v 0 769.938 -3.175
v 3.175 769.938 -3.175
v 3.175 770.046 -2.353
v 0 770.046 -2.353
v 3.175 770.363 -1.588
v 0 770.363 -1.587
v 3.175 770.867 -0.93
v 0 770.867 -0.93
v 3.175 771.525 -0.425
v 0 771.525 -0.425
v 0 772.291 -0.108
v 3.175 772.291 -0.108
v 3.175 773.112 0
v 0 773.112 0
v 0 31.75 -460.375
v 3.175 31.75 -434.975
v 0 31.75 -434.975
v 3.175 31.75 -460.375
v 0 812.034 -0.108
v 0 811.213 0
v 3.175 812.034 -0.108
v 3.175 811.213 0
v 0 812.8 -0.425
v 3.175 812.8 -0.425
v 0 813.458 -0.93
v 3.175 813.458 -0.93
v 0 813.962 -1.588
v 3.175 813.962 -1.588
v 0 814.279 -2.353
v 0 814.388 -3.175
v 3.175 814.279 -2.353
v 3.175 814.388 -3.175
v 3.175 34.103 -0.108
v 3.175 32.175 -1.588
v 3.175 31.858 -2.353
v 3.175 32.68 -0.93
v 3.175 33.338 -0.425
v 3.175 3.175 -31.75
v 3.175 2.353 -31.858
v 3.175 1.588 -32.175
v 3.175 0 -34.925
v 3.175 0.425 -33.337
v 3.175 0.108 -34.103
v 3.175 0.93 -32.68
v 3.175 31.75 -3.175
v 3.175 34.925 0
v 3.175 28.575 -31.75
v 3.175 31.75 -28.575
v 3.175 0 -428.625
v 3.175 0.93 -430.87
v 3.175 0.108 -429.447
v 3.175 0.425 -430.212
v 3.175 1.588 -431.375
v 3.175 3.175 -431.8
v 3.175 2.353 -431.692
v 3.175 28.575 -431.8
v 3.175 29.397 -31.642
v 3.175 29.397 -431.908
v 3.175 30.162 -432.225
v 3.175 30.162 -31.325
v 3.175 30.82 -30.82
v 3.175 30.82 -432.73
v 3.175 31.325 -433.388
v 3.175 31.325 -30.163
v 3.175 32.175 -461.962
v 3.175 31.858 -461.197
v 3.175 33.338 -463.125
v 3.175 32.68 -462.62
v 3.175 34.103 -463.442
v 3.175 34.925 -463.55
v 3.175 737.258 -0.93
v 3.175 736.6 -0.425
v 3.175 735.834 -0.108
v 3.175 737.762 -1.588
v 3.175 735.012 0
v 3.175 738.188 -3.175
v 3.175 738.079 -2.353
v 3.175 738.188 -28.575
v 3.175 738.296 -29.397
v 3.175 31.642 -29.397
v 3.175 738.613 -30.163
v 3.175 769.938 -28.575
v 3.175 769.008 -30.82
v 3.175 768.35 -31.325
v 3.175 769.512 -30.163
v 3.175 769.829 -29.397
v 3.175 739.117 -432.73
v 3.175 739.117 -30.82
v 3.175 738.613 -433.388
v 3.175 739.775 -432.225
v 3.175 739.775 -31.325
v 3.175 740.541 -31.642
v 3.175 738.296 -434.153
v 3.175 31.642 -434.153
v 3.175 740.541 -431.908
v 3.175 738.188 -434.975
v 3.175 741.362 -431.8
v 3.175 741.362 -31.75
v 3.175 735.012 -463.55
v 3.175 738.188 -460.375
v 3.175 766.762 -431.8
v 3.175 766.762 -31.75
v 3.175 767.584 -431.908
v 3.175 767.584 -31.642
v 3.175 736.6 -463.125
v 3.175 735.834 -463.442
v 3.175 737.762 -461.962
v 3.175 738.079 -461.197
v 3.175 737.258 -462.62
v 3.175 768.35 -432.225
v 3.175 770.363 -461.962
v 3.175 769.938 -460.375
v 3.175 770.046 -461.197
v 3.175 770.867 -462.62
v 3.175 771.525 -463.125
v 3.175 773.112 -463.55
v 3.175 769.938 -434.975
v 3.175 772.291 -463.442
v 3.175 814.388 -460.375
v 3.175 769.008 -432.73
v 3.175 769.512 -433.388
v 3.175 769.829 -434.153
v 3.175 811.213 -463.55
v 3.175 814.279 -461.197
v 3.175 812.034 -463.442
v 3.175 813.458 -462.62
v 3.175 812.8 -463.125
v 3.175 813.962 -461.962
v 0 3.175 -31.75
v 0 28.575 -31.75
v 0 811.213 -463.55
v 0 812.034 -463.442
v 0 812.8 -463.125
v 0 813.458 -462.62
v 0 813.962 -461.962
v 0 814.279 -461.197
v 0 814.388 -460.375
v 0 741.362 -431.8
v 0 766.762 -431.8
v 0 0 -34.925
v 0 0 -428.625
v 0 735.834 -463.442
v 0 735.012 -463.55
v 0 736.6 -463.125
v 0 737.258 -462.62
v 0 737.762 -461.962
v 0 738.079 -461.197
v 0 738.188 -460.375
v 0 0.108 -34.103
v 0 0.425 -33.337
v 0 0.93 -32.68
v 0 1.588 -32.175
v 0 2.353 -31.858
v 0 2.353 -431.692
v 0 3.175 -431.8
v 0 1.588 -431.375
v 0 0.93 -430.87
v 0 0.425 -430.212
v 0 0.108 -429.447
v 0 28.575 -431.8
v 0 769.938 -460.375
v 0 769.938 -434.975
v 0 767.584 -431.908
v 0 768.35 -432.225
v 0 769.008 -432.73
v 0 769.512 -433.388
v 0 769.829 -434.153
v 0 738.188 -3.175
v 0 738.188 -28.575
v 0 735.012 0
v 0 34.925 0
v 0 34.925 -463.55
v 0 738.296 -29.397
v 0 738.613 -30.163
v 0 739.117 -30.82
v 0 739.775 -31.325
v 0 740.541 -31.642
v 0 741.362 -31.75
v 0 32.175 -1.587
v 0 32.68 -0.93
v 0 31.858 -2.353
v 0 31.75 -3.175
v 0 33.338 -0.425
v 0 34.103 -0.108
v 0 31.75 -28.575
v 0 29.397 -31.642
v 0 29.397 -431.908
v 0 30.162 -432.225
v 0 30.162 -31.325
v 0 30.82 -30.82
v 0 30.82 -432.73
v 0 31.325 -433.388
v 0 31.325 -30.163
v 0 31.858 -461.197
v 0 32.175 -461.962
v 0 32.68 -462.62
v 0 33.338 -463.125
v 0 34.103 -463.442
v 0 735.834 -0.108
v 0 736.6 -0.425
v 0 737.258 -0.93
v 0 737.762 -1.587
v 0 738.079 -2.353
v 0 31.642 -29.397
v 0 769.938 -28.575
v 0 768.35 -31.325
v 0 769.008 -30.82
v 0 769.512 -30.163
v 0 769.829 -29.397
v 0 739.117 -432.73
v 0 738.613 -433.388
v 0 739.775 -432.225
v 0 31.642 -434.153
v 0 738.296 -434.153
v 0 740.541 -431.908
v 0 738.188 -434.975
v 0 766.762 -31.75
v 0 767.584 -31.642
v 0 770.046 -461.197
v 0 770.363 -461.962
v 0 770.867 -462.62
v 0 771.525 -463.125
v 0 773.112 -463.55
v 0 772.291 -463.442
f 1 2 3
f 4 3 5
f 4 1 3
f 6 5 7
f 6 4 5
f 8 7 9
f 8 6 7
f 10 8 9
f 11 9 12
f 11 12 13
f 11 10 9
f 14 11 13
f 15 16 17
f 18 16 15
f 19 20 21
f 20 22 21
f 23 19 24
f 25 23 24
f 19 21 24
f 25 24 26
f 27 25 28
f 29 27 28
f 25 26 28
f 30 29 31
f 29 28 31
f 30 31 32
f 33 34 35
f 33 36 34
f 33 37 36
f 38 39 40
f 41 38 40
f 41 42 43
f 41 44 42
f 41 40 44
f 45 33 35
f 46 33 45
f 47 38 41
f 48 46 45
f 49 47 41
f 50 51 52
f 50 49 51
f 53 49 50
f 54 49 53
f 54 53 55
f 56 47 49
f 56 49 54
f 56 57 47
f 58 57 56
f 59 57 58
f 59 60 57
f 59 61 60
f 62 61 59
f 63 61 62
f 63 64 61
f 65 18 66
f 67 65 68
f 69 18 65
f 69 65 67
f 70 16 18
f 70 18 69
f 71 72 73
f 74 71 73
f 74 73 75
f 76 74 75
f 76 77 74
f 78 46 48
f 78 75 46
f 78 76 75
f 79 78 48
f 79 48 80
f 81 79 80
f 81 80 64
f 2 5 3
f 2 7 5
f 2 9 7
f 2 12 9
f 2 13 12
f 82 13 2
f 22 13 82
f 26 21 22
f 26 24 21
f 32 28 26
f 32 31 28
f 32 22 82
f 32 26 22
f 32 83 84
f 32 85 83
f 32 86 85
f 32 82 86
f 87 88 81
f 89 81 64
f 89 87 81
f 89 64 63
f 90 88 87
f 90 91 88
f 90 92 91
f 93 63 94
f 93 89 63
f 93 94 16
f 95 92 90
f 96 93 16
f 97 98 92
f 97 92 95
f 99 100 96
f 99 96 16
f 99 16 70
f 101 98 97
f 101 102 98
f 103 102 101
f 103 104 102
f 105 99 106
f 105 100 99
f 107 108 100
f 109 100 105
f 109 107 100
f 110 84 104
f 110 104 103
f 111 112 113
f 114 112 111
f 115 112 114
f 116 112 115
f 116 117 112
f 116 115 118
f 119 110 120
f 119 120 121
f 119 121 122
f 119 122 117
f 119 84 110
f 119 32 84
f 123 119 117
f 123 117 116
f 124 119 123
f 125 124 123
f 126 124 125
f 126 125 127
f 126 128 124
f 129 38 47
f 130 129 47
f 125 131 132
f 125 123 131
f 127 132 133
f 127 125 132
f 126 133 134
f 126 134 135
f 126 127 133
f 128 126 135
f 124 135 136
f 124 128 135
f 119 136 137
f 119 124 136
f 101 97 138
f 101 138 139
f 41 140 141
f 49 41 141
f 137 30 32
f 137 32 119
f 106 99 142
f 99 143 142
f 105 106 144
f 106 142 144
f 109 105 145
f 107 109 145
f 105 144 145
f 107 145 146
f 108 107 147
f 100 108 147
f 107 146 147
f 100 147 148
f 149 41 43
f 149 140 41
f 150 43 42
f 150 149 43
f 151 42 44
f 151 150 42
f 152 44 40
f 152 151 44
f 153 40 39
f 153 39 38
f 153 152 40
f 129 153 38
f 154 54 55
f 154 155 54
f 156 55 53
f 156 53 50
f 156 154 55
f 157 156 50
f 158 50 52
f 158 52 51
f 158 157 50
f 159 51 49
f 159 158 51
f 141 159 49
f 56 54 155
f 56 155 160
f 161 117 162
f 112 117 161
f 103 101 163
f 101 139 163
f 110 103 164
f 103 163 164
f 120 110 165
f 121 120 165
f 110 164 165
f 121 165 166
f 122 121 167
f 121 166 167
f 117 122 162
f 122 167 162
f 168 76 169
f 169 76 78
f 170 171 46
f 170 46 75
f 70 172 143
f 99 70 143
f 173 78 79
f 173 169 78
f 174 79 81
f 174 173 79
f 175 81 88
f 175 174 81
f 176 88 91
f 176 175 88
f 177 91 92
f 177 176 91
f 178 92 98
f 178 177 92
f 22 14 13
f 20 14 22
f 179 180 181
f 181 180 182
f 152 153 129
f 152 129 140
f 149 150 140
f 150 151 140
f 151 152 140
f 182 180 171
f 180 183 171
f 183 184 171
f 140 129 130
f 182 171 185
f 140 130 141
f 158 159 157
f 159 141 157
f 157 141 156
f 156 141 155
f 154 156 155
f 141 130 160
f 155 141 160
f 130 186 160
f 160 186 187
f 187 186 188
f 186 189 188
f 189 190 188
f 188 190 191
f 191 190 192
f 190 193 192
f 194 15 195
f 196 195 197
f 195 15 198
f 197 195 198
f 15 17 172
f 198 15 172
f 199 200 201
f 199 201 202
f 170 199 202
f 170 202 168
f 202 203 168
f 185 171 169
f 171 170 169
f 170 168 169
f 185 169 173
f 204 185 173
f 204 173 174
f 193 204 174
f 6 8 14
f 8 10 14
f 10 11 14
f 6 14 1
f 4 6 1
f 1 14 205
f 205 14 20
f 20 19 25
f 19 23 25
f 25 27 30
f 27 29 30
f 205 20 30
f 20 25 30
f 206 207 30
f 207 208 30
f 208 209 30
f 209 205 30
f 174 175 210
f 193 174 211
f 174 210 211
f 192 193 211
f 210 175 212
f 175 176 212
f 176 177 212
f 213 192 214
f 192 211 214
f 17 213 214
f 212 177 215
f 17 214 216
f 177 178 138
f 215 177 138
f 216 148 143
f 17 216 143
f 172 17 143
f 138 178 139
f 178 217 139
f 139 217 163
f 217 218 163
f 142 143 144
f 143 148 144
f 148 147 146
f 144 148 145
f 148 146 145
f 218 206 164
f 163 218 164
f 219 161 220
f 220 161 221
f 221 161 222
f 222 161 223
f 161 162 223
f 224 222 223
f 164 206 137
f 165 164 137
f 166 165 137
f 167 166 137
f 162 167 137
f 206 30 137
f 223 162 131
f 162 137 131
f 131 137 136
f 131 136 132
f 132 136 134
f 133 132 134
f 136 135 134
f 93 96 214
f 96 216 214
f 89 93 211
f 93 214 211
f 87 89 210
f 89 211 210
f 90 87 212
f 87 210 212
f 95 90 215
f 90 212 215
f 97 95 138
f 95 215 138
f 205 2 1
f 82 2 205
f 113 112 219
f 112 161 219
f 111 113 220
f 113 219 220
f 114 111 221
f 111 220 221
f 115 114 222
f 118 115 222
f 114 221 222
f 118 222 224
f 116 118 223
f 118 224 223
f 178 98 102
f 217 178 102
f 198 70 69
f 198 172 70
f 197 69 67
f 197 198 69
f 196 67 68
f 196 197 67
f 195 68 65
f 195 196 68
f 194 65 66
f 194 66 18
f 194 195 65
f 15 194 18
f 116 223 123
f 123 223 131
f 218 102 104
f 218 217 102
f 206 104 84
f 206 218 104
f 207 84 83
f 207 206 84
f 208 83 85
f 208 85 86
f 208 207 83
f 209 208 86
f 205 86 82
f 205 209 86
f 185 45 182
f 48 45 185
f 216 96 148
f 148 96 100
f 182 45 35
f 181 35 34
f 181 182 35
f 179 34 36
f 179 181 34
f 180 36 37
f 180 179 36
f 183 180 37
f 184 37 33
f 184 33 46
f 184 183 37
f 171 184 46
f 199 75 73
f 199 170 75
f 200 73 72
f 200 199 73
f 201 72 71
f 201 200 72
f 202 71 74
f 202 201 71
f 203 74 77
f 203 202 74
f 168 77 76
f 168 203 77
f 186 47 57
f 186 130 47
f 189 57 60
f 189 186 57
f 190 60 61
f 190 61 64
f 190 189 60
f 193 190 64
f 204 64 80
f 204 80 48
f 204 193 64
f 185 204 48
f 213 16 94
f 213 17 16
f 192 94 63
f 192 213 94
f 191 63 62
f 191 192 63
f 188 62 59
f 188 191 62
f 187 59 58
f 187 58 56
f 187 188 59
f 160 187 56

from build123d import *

# Parameters (mm, degrees)
SKETCH1_W           = 463.55
SKETCH1_H           = 814.3875
BOSS_EXTRUDE1_DEPTH = 3.175
FILLET1_R           = 3.175
CUT_EXTRUDE2_REACH  = 939.078
SKETCH3_W           = 31.75
SKETCH3_H           = 31.75
FILLET2_R           = 3.175
FILLET3_R           = 3.175
FILLET4_R           = 3.175


with BuildPart() as part:
    # Sketch1 → Boss-Extrude1 (new body)
    with BuildSketch(Plane(origin=(0, 0, 0), x_dir=(0, 0, -1), z_dir=(1, 0, 0))):
        with Locations((231.775, 407.19375)):
            Rectangle(SKETCH1_W, SKETCH1_H)
    extrude(amount=BOSS_EXTRUDE1_DEPTH)

    # Fillet1
    fillet1_edges = [part.edges().sort_by_distance(p)[0] for p in [
        (1.5875, 814.3875, 0),
        (1.5875, 814.3875, -463.55),
        (1.5875, 0, -463.55),
        (1.5875, 0, 0),
    ]]
    fillet(fillet1_edges, radius=FILLET1_R)

    # Sketch3 → Cut-Extrude2 (cut, up to next)
    with BuildSketch(Plane(origin=(3.175, 0, 0), x_dir=(0, 0, -1), z_dir=(1, 0, 0)), mode=Mode.PRIVATE) as cut_extrude2_sk1:
        with Locations((15.875, 754.0625)):
            Rectangle(SKETCH3_W, SKETCH3_H)
    cut_extrude2_tool1 = extrude(cut_extrude2_sk1.sketch, amount=-CUT_EXTRUDE2_REACH, mode=Mode.PRIVATE) & part.part
    # Sketch3 → Cut-Extrude2 (cut, up to next)
    with BuildSketch(Plane(origin=(3.175, 0, 0), x_dir=(0, 0, -1), z_dir=(1, 0, 0)), mode=Mode.PRIVATE) as cut_extrude2_sk2:
        with Locations((447.675, 754.0625)):
            Rectangle(SKETCH3_W, SKETCH3_H)
    cut_extrude2_tool2 = extrude(cut_extrude2_sk2.sketch, amount=-CUT_EXTRUDE2_REACH, mode=Mode.PRIVATE) & part.part
    # Sketch3 → Cut-Extrude2 (cut, up to next)
    with BuildSketch(Plane(origin=(3.175, 0, 0), x_dir=(0, 0, -1), z_dir=(1, 0, 0)), mode=Mode.PRIVATE) as cut_extrude2_sk3:
        with Locations((447.675, 15.875)):
            Rectangle(SKETCH3_W, SKETCH3_H)
    cut_extrude2_tool3 = extrude(cut_extrude2_sk3.sketch, amount=-CUT_EXTRUDE2_REACH, mode=Mode.PRIVATE) & part.part
    # Sketch3 → Cut-Extrude2 (cut, up to next)
    with BuildSketch(Plane(origin=(3.175, 0, 0), x_dir=(0, 0, -1), z_dir=(1, 0, 0)), mode=Mode.PRIVATE) as cut_extrude2_sk4:
        with Locations((15.875, 15.875)):
            Rectangle(SKETCH3_W, SKETCH3_H)
    cut_extrude2_tool4 = extrude(cut_extrude2_sk4.sketch, amount=-CUT_EXTRUDE2_REACH, mode=Mode.PRIVATE) & part.part
    add(cut_extrude2_tool1.solids().sort_by_distance((3.175, 754.0625, -15.875))[0], mode=Mode.SUBTRACT)
    add(cut_extrude2_tool2.solids().sort_by_distance((3.175, 754.0625, -447.675))[0], mode=Mode.SUBTRACT)
    add(cut_extrude2_tool3.solids().sort_by_distance((3.175, 15.875, -447.675))[0], mode=Mode.SUBTRACT)
    add(cut_extrude2_tool4.solids().sort_by_distance((3.175, 15.875, -15.875))[0], mode=Mode.SUBTRACT)

    # Fillet2
    fillet2_edges = [part.edges().sort_by_distance(p)[0] for p in [
        (1.5875, 738.1875, 0),
        (1.5875, 769.9375, 0),
        (1.5875, 769.9375, -31.75),
        (1.5875, 738.1875, -31.75),
    ]]
    fillet(fillet2_edges, radius=FILLET2_R)

    # Fillet3
    fillet3_edges = [part.edges().sort_by_distance(p)[0] for p in [
        (1.5875, 769.9375, -431.8),
        (1.5875, 769.9375, -463.55),
        (1.5875, 738.1875, -463.55),
        (1.5875, 738.1875, -431.8),
    ]]
    fillet(fillet3_edges, radius=FILLET3_R)

    # Fillet4
    fillet4_edges = [part.edges().sort_by_distance(p)[0] for p in [
        (1.5875, 31.75, 0),
        (1.5875, 31.75, -31.75),
        (1.5875, 0, -31.75),
        (1.5875, 0, -431.8),
        (1.5875, 31.75, -431.8),
        (1.5875, 31.75, -463.55),
    ]]
    fillet(fillet4_edges, radius=FILLET4_R)


solid = part.part
